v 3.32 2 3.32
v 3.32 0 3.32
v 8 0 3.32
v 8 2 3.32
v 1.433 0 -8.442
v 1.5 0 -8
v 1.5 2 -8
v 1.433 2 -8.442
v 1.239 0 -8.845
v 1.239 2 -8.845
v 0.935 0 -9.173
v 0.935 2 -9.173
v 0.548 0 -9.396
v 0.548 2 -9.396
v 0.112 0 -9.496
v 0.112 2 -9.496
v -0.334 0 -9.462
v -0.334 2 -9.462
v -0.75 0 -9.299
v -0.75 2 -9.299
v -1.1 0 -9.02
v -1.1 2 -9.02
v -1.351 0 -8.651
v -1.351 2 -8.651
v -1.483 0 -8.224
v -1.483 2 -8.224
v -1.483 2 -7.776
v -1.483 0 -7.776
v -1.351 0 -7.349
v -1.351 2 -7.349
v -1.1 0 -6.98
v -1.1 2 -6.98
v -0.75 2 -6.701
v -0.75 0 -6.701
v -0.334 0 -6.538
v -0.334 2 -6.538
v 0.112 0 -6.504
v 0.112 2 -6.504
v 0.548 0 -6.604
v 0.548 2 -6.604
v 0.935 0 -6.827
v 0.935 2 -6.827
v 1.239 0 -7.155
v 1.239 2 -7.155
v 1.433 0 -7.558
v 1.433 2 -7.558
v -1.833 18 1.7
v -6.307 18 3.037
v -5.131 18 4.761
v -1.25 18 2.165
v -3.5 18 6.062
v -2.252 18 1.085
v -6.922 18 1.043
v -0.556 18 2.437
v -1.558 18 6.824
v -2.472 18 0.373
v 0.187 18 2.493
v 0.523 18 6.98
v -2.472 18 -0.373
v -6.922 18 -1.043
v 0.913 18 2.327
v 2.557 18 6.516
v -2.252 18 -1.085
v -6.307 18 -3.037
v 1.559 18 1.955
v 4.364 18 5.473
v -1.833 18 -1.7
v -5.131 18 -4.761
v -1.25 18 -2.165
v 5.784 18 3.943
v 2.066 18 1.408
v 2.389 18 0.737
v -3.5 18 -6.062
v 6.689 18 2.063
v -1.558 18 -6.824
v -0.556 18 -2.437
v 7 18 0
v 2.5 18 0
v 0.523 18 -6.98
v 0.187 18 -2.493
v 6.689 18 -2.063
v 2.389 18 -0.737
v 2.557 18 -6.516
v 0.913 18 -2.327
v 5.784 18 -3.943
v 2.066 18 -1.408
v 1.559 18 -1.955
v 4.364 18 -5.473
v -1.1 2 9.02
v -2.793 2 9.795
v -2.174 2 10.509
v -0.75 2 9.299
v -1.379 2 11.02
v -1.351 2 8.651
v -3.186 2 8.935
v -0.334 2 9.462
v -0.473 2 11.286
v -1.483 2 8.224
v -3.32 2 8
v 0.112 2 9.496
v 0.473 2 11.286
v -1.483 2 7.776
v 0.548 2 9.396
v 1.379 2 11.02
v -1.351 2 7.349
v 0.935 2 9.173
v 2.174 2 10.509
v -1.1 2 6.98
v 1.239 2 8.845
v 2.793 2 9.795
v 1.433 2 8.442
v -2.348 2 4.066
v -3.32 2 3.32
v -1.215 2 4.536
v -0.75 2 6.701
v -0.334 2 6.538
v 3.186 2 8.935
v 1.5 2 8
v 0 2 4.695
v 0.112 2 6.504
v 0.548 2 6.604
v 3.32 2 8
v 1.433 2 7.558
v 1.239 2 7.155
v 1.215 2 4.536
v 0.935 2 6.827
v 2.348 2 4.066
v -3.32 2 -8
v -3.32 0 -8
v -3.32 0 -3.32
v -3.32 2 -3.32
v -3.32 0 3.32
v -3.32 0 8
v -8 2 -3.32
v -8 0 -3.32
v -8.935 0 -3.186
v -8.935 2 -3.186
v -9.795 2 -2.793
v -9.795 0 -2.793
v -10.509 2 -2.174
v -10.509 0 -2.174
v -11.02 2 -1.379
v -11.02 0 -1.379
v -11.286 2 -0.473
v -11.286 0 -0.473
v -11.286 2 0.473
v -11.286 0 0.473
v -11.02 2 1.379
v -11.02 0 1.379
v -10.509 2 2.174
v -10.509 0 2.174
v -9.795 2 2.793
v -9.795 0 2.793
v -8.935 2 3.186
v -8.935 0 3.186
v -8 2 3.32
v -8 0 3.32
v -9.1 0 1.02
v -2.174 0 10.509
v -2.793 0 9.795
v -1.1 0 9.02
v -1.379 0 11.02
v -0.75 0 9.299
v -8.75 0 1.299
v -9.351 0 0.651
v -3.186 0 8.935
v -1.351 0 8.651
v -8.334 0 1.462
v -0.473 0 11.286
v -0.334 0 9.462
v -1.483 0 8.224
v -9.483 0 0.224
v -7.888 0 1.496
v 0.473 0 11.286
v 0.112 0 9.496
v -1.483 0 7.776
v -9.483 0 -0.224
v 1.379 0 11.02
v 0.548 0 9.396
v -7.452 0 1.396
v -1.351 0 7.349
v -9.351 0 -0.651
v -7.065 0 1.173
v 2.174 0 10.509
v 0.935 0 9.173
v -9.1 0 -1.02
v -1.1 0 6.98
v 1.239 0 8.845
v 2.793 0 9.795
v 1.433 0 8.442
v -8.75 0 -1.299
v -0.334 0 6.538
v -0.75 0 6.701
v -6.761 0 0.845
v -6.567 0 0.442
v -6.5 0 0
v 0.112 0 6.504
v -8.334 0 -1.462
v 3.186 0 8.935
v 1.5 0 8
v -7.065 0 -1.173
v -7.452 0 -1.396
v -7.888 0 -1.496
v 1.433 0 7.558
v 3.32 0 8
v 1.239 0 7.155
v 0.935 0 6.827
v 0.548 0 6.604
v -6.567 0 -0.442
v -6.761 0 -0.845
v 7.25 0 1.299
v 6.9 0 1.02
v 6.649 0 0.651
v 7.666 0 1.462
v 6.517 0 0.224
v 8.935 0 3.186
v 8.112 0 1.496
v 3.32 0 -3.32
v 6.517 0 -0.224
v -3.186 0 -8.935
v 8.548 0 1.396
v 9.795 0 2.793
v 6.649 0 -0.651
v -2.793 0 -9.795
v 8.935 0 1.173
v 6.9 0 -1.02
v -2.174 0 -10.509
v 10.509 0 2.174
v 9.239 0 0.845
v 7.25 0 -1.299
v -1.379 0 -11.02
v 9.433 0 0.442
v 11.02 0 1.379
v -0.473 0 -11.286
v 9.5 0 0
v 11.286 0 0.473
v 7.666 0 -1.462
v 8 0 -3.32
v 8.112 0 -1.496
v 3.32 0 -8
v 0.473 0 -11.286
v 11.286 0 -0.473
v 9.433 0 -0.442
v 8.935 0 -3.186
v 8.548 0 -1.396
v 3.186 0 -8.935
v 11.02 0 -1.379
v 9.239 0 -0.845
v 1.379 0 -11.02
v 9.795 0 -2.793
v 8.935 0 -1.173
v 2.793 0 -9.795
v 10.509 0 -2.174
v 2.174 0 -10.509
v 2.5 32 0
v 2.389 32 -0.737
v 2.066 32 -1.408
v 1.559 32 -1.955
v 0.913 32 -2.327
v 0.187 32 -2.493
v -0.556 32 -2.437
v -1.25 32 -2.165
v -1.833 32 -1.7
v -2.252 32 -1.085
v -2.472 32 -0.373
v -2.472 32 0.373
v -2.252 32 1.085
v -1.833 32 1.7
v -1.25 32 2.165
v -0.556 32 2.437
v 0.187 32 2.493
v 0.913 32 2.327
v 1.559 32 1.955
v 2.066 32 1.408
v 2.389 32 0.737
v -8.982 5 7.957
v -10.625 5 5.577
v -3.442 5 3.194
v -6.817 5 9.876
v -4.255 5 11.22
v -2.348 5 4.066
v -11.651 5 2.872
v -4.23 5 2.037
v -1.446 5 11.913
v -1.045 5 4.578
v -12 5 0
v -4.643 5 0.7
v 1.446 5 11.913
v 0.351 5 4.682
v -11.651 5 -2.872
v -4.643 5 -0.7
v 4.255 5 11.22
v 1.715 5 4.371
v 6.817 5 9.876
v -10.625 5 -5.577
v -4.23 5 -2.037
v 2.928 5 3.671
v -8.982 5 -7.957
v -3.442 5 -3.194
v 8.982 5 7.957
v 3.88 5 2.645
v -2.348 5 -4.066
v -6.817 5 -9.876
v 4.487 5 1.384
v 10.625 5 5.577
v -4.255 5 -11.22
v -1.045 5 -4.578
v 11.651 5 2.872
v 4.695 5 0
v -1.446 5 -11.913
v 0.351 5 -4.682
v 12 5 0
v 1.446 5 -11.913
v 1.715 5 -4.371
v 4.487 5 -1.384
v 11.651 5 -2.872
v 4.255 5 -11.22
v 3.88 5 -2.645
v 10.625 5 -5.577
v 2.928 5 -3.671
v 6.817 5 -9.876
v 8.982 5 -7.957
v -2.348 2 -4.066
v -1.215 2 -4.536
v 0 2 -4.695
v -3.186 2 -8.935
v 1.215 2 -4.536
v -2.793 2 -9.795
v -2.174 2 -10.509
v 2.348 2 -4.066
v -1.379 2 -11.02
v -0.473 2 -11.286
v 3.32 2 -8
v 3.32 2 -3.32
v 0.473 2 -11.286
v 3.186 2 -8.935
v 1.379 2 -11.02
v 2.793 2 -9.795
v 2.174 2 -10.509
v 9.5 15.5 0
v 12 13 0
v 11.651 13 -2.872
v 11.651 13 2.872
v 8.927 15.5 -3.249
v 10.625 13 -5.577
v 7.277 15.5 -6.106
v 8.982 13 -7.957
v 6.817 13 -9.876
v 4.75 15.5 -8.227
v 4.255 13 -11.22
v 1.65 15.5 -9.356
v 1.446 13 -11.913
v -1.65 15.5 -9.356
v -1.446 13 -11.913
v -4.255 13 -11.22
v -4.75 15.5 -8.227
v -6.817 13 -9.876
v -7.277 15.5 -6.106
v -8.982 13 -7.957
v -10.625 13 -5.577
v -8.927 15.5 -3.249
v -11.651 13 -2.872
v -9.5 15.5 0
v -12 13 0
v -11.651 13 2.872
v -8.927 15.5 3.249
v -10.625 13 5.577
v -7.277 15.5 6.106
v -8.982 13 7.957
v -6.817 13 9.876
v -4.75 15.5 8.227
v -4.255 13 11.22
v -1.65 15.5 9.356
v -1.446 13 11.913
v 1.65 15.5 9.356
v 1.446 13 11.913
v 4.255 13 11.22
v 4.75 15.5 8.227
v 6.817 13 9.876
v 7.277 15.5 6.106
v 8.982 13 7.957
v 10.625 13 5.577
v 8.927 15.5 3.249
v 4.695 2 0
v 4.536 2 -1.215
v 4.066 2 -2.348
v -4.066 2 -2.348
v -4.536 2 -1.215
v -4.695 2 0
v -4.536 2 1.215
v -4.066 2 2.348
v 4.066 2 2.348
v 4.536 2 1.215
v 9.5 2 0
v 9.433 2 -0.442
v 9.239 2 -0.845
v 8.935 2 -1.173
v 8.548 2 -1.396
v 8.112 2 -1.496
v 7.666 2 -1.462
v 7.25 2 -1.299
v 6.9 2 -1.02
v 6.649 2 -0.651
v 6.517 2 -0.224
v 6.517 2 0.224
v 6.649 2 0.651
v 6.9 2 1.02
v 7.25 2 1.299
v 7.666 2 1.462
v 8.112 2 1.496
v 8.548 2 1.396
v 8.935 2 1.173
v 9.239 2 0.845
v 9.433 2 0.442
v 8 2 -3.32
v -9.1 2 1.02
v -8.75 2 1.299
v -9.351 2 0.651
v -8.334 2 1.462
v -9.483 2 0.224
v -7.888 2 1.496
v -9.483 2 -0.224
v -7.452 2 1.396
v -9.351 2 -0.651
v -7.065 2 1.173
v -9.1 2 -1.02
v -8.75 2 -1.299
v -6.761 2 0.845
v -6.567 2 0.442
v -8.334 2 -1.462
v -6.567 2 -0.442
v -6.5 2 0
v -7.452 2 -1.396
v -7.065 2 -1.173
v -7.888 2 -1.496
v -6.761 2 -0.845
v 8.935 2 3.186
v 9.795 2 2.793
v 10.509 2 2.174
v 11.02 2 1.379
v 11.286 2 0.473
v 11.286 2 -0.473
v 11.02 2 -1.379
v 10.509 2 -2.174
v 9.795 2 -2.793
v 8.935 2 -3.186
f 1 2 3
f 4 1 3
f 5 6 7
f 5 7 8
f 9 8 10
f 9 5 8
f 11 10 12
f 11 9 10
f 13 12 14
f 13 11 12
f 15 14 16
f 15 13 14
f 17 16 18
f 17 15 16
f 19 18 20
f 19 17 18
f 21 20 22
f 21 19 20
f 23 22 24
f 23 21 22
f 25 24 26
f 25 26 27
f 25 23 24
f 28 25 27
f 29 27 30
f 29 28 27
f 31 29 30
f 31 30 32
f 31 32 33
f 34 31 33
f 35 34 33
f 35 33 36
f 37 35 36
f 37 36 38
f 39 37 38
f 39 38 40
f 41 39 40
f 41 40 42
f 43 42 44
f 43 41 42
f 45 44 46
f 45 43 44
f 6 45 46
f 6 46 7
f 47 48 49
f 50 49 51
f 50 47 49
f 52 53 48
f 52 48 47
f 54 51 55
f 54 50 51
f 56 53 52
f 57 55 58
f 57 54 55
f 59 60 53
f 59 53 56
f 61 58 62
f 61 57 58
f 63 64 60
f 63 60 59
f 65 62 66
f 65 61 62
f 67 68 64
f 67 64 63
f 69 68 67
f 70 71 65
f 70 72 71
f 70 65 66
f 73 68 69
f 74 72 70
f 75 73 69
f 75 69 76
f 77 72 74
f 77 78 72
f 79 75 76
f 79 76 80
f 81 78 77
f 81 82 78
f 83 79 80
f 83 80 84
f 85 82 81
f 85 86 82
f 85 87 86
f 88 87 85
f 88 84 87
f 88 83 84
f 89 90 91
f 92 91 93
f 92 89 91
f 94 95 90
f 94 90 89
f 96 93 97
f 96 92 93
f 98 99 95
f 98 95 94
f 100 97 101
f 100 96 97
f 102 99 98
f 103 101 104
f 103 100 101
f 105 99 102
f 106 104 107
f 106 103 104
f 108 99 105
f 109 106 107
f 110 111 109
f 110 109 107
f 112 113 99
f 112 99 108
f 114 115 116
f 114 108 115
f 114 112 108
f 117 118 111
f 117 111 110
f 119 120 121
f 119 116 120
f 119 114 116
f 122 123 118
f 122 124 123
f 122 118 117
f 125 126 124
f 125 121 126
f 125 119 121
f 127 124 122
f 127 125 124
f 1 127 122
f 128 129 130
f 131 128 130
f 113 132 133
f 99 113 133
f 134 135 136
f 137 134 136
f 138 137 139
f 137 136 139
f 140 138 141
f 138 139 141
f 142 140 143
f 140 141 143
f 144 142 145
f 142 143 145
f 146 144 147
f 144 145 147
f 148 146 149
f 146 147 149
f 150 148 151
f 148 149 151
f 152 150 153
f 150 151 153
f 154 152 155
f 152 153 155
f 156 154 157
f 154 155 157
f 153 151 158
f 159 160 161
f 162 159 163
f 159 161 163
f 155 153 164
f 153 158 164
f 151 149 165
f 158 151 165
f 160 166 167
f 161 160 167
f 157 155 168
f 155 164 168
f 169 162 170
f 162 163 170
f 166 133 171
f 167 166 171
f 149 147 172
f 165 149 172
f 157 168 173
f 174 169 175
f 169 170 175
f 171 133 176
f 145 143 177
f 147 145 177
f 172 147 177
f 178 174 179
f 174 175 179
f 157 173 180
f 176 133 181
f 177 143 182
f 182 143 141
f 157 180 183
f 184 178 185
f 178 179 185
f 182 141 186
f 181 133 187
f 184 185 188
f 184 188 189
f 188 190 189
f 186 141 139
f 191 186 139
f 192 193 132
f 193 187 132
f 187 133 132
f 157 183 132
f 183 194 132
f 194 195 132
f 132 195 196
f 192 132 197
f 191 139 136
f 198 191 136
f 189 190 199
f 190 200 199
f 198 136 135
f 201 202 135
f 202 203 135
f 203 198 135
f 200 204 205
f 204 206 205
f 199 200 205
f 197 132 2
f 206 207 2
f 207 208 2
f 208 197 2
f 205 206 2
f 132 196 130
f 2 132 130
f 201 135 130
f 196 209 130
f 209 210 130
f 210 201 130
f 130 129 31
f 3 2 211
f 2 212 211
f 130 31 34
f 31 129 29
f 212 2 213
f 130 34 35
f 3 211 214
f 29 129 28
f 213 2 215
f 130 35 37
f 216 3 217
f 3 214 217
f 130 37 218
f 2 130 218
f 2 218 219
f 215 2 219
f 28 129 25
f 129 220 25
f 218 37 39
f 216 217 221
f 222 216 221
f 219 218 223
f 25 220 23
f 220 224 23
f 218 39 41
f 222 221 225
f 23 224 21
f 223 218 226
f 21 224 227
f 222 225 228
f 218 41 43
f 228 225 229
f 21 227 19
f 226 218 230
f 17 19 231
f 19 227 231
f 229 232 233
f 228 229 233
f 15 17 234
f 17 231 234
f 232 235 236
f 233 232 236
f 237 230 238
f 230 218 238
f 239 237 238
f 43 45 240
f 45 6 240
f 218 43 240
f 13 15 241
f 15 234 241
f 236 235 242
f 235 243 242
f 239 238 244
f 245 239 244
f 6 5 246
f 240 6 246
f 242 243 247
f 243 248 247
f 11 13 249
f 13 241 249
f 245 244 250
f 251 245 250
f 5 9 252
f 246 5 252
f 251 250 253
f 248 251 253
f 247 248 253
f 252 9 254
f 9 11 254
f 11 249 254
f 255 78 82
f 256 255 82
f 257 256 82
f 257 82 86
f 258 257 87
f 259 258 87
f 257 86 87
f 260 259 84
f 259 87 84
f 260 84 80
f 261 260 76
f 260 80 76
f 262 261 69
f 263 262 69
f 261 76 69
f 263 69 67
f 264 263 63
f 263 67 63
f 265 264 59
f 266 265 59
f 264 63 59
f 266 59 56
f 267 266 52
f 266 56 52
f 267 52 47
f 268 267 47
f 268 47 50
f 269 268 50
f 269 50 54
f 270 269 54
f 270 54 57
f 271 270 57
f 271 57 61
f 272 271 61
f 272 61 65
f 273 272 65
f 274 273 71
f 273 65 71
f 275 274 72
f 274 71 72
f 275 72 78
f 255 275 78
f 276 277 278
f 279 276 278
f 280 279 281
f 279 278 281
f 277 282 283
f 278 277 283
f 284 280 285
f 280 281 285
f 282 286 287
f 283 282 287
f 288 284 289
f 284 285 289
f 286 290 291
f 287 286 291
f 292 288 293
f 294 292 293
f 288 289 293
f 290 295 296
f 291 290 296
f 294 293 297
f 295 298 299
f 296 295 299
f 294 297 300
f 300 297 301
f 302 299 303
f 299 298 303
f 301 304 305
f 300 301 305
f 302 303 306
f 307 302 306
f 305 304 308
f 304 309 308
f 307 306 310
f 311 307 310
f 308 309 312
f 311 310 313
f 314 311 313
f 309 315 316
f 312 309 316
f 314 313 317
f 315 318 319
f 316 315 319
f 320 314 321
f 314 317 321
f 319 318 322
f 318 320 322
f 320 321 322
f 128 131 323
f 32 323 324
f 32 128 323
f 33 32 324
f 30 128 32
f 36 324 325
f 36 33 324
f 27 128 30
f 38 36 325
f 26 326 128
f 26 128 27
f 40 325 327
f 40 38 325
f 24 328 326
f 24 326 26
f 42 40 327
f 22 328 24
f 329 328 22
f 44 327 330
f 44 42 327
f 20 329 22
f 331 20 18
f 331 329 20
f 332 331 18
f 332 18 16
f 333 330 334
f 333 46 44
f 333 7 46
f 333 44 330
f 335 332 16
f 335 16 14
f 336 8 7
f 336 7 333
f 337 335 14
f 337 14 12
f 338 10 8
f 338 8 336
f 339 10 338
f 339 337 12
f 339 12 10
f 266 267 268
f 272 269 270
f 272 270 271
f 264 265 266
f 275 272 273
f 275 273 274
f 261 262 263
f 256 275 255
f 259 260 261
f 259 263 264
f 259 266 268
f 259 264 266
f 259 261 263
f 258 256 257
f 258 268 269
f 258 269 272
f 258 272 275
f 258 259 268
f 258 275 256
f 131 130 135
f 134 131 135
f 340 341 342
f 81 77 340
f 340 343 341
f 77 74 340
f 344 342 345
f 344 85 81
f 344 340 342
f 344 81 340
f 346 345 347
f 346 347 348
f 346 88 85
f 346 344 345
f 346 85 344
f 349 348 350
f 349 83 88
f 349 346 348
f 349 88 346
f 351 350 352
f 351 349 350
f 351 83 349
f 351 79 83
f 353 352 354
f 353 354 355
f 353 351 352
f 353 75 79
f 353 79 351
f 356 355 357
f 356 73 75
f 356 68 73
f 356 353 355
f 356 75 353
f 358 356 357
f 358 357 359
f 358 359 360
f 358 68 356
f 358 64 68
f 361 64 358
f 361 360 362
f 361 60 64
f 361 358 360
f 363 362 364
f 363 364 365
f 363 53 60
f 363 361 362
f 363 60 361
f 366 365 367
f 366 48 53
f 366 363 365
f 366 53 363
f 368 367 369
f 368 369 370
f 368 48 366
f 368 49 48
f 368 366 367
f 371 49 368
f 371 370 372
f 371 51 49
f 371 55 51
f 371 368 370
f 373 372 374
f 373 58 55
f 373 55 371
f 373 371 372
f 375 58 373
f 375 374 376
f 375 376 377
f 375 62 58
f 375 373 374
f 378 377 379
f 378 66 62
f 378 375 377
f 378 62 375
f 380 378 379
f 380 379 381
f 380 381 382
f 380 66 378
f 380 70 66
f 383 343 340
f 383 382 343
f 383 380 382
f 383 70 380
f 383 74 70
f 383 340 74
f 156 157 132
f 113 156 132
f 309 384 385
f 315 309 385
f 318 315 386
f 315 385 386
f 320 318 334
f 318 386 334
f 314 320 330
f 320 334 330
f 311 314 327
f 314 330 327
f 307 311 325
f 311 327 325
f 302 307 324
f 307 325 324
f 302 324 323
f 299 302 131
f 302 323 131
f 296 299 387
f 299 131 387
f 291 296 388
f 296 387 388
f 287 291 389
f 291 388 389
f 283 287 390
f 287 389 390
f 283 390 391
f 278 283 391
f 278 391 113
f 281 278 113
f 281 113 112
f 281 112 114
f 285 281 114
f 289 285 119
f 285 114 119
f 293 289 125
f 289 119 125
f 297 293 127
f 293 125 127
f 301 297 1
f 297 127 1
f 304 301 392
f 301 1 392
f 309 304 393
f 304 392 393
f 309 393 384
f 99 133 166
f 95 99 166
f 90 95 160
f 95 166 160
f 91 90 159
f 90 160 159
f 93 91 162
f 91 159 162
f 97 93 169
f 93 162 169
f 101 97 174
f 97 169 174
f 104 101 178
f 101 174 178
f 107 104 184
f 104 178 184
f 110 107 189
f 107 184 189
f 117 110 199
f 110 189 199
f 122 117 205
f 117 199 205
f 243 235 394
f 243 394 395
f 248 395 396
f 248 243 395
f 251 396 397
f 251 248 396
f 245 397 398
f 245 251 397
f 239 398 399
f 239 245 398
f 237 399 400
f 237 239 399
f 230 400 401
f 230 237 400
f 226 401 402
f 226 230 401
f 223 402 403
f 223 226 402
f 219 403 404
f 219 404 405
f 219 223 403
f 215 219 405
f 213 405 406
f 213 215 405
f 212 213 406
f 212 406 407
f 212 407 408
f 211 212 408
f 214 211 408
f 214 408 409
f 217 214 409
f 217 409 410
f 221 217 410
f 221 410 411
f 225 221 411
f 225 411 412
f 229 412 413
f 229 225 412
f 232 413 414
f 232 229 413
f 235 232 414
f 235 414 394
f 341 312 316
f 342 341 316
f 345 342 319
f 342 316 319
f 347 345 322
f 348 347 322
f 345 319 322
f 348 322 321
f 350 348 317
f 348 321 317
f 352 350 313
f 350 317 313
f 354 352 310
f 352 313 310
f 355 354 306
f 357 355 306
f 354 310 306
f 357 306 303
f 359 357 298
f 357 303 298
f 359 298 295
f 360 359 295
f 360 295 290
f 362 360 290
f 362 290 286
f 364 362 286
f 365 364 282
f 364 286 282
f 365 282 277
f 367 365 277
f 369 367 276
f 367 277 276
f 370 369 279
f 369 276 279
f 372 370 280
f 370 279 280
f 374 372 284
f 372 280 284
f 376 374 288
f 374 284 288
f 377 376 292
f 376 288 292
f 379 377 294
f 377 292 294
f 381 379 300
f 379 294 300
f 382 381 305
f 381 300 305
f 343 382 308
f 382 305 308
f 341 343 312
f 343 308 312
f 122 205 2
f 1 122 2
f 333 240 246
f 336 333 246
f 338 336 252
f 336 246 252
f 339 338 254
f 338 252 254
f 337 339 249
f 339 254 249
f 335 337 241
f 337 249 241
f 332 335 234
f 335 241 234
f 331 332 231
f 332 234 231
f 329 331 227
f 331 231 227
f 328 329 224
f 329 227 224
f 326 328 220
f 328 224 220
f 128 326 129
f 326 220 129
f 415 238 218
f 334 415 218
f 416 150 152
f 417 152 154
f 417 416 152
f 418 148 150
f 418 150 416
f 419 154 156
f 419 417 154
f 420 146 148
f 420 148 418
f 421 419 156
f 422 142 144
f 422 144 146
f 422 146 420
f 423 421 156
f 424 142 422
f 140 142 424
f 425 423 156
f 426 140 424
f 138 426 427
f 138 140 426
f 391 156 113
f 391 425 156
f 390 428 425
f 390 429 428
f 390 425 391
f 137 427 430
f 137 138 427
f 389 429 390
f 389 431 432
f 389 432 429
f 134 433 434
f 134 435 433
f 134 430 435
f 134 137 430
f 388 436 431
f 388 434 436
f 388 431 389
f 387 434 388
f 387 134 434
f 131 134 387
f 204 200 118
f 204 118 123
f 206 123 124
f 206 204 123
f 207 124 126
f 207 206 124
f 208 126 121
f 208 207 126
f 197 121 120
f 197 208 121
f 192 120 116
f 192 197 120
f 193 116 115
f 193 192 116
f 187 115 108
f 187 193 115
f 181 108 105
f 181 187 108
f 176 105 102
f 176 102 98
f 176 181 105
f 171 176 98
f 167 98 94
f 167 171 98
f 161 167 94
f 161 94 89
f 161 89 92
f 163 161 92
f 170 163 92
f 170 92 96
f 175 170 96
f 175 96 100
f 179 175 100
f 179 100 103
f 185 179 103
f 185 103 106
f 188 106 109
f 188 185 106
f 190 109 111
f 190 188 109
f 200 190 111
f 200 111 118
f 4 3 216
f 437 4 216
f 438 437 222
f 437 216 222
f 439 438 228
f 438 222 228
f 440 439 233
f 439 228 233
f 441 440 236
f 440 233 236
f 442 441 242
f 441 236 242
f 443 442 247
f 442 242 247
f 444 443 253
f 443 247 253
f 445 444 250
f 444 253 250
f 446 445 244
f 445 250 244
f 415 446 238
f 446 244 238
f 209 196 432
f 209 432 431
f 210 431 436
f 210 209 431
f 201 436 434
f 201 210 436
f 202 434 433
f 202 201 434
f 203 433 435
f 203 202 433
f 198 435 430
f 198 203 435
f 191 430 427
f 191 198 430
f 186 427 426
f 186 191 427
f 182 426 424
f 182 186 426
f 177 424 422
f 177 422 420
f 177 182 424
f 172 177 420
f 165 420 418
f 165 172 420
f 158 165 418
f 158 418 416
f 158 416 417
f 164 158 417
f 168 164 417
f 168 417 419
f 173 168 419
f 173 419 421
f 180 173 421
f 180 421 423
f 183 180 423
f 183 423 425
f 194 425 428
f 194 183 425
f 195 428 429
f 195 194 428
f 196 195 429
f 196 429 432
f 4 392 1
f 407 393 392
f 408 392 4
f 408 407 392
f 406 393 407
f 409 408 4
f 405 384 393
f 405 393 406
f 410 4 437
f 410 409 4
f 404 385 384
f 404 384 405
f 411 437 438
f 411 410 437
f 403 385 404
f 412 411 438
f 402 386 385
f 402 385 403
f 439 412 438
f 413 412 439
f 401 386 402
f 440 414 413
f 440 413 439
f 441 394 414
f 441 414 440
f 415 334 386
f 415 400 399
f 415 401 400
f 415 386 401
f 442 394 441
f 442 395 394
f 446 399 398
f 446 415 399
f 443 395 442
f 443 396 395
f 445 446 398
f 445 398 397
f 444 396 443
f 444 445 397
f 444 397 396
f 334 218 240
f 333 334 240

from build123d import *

# Parameters (mm, degrees)
SKETCH_1_R      = 1.5
EXTRUDE_1_DEPTH = 2
SKETCH_2_R      = 4.695496225
EXTRUDE_2_DEPTH = 3
SKETCH_3_R      = 12
EXTRUDE_3_DEPTH = 13
CHAMFER_1_SIZE  = 5
SKETCH_4_R      = 2.5
EXTRUDE_4_DEPTH = 14


with BuildPart() as part:
    # 草图1 → 凸台-拉伸1 (new body)
    with BuildSketch(Plane(origin=(0, 0, 0), x_dir=(1, 0, 0), z_dir=(0, 1, 0))):
        with BuildLine():
            Line((-3.320217222, -4.320217222), (-3.320217222, -8))
            ThreePointArc((-3.320217222, -8), (0, -11.320217222), (3.320217222, -8))
            Line((3.320217222, -8), (3.320217222, -4.320217222))
            Line((3.320217222, -4.320217222), (3.320217222, -3.320217222))
            Line((3.320217222, -3.320217222), (4.320217222, -3.320217222))
            Line((4.320217222, -3.320217222), (8, -3.320217222))
            ThreePointArc((8, -3.320217222), (11.320217222, 0), (8, 3.320217222))
            Line((8, 3.320217222), (4.320217222, 3.320217222))
            Line((4.320217222, 3.320217222), (3.320217222, 3.320217222))
            Line((3.320217222, 3.320217222), (3.320217222, 4.320217222))
            Line((3.320217222, 4.320217222), (3.320217222, 8))
            ThreePointArc((3.320217222, 8), (0, 11.320217222), (-3.320217222, 8))
            Line((-3.320217222, 8), (-3.320217222, 4.320217222))
            Line((-3.320217222, 4.320217222), (-3.320217222, 3.320217222))
            Line((-3.320217222, 3.320217222), (-4.320217222, 3.320217222))
            Line((-4.320217222, 3.320217222), (-8, 3.320217222))
            ThreePointArc((-8, 3.320217222), (-11.320217222, 0), (-8, -3.320217222))
            Line((-8, -3.320217222), (-4.320217222, -3.320217222))
            Line((-4.320217222, -3.320217222), (-3.320217222, -3.320217222))
            Line((-3.320217222, -3.320217222), (-3.320217222, -4.320217222))
        make_face()
        with Locations((0, -8)):
            Circle(SKETCH_1_R, mode=Mode.SUBTRACT)
        with Locations((8, 0)):
            Circle(SKETCH_1_R, mode=Mode.SUBTRACT)
        with Locations((-8, 0)):
            Circle(SKETCH_1_R, mode=Mode.SUBTRACT)
        with Locations((0, 8)):
            Circle(SKETCH_1_R, mode=Mode.SUBTRACT)
    extrude(amount=EXTRUDE_1_DEPTH)

    # 草图2 → 凸台-拉伸2 (add)
    with BuildSketch(Plane(origin=(0, 2, 0), x_dir=(1, 0, 0), z_dir=(0, 1, 0))):
        Circle(SKETCH_2_R)
    extrude(amount=EXTRUDE_2_DEPTH)

    # 草图3 → 凸台-拉伸3 (add)
    with BuildSketch(Plane(origin=(0, 5, 0), x_dir=(1, 0, 0), z_dir=(0, 1, 0))):
        Circle(SKETCH_3_R)
    extrude(amount=EXTRUDE_3_DEPTH)

    # 倒角1
    chamfer_1_edges = [part.edges().sort_by_distance(p)[0] for p in [
        (-12, 18, 0),
    ]]
    chamfer(chamfer_1_edges, length=CHAMFER_1_SIZE)

    # 草图4 → 凸台-拉伸4 (add)
    with BuildSketch(Plane(origin=(0, 18, 0), x_dir=(1, 0, 0), z_dir=(0, 1, 0))):
        Circle(SKETCH_4_R)
    extrude(amount=EXTRUDE_4_DEPTH)


solid = part.part
